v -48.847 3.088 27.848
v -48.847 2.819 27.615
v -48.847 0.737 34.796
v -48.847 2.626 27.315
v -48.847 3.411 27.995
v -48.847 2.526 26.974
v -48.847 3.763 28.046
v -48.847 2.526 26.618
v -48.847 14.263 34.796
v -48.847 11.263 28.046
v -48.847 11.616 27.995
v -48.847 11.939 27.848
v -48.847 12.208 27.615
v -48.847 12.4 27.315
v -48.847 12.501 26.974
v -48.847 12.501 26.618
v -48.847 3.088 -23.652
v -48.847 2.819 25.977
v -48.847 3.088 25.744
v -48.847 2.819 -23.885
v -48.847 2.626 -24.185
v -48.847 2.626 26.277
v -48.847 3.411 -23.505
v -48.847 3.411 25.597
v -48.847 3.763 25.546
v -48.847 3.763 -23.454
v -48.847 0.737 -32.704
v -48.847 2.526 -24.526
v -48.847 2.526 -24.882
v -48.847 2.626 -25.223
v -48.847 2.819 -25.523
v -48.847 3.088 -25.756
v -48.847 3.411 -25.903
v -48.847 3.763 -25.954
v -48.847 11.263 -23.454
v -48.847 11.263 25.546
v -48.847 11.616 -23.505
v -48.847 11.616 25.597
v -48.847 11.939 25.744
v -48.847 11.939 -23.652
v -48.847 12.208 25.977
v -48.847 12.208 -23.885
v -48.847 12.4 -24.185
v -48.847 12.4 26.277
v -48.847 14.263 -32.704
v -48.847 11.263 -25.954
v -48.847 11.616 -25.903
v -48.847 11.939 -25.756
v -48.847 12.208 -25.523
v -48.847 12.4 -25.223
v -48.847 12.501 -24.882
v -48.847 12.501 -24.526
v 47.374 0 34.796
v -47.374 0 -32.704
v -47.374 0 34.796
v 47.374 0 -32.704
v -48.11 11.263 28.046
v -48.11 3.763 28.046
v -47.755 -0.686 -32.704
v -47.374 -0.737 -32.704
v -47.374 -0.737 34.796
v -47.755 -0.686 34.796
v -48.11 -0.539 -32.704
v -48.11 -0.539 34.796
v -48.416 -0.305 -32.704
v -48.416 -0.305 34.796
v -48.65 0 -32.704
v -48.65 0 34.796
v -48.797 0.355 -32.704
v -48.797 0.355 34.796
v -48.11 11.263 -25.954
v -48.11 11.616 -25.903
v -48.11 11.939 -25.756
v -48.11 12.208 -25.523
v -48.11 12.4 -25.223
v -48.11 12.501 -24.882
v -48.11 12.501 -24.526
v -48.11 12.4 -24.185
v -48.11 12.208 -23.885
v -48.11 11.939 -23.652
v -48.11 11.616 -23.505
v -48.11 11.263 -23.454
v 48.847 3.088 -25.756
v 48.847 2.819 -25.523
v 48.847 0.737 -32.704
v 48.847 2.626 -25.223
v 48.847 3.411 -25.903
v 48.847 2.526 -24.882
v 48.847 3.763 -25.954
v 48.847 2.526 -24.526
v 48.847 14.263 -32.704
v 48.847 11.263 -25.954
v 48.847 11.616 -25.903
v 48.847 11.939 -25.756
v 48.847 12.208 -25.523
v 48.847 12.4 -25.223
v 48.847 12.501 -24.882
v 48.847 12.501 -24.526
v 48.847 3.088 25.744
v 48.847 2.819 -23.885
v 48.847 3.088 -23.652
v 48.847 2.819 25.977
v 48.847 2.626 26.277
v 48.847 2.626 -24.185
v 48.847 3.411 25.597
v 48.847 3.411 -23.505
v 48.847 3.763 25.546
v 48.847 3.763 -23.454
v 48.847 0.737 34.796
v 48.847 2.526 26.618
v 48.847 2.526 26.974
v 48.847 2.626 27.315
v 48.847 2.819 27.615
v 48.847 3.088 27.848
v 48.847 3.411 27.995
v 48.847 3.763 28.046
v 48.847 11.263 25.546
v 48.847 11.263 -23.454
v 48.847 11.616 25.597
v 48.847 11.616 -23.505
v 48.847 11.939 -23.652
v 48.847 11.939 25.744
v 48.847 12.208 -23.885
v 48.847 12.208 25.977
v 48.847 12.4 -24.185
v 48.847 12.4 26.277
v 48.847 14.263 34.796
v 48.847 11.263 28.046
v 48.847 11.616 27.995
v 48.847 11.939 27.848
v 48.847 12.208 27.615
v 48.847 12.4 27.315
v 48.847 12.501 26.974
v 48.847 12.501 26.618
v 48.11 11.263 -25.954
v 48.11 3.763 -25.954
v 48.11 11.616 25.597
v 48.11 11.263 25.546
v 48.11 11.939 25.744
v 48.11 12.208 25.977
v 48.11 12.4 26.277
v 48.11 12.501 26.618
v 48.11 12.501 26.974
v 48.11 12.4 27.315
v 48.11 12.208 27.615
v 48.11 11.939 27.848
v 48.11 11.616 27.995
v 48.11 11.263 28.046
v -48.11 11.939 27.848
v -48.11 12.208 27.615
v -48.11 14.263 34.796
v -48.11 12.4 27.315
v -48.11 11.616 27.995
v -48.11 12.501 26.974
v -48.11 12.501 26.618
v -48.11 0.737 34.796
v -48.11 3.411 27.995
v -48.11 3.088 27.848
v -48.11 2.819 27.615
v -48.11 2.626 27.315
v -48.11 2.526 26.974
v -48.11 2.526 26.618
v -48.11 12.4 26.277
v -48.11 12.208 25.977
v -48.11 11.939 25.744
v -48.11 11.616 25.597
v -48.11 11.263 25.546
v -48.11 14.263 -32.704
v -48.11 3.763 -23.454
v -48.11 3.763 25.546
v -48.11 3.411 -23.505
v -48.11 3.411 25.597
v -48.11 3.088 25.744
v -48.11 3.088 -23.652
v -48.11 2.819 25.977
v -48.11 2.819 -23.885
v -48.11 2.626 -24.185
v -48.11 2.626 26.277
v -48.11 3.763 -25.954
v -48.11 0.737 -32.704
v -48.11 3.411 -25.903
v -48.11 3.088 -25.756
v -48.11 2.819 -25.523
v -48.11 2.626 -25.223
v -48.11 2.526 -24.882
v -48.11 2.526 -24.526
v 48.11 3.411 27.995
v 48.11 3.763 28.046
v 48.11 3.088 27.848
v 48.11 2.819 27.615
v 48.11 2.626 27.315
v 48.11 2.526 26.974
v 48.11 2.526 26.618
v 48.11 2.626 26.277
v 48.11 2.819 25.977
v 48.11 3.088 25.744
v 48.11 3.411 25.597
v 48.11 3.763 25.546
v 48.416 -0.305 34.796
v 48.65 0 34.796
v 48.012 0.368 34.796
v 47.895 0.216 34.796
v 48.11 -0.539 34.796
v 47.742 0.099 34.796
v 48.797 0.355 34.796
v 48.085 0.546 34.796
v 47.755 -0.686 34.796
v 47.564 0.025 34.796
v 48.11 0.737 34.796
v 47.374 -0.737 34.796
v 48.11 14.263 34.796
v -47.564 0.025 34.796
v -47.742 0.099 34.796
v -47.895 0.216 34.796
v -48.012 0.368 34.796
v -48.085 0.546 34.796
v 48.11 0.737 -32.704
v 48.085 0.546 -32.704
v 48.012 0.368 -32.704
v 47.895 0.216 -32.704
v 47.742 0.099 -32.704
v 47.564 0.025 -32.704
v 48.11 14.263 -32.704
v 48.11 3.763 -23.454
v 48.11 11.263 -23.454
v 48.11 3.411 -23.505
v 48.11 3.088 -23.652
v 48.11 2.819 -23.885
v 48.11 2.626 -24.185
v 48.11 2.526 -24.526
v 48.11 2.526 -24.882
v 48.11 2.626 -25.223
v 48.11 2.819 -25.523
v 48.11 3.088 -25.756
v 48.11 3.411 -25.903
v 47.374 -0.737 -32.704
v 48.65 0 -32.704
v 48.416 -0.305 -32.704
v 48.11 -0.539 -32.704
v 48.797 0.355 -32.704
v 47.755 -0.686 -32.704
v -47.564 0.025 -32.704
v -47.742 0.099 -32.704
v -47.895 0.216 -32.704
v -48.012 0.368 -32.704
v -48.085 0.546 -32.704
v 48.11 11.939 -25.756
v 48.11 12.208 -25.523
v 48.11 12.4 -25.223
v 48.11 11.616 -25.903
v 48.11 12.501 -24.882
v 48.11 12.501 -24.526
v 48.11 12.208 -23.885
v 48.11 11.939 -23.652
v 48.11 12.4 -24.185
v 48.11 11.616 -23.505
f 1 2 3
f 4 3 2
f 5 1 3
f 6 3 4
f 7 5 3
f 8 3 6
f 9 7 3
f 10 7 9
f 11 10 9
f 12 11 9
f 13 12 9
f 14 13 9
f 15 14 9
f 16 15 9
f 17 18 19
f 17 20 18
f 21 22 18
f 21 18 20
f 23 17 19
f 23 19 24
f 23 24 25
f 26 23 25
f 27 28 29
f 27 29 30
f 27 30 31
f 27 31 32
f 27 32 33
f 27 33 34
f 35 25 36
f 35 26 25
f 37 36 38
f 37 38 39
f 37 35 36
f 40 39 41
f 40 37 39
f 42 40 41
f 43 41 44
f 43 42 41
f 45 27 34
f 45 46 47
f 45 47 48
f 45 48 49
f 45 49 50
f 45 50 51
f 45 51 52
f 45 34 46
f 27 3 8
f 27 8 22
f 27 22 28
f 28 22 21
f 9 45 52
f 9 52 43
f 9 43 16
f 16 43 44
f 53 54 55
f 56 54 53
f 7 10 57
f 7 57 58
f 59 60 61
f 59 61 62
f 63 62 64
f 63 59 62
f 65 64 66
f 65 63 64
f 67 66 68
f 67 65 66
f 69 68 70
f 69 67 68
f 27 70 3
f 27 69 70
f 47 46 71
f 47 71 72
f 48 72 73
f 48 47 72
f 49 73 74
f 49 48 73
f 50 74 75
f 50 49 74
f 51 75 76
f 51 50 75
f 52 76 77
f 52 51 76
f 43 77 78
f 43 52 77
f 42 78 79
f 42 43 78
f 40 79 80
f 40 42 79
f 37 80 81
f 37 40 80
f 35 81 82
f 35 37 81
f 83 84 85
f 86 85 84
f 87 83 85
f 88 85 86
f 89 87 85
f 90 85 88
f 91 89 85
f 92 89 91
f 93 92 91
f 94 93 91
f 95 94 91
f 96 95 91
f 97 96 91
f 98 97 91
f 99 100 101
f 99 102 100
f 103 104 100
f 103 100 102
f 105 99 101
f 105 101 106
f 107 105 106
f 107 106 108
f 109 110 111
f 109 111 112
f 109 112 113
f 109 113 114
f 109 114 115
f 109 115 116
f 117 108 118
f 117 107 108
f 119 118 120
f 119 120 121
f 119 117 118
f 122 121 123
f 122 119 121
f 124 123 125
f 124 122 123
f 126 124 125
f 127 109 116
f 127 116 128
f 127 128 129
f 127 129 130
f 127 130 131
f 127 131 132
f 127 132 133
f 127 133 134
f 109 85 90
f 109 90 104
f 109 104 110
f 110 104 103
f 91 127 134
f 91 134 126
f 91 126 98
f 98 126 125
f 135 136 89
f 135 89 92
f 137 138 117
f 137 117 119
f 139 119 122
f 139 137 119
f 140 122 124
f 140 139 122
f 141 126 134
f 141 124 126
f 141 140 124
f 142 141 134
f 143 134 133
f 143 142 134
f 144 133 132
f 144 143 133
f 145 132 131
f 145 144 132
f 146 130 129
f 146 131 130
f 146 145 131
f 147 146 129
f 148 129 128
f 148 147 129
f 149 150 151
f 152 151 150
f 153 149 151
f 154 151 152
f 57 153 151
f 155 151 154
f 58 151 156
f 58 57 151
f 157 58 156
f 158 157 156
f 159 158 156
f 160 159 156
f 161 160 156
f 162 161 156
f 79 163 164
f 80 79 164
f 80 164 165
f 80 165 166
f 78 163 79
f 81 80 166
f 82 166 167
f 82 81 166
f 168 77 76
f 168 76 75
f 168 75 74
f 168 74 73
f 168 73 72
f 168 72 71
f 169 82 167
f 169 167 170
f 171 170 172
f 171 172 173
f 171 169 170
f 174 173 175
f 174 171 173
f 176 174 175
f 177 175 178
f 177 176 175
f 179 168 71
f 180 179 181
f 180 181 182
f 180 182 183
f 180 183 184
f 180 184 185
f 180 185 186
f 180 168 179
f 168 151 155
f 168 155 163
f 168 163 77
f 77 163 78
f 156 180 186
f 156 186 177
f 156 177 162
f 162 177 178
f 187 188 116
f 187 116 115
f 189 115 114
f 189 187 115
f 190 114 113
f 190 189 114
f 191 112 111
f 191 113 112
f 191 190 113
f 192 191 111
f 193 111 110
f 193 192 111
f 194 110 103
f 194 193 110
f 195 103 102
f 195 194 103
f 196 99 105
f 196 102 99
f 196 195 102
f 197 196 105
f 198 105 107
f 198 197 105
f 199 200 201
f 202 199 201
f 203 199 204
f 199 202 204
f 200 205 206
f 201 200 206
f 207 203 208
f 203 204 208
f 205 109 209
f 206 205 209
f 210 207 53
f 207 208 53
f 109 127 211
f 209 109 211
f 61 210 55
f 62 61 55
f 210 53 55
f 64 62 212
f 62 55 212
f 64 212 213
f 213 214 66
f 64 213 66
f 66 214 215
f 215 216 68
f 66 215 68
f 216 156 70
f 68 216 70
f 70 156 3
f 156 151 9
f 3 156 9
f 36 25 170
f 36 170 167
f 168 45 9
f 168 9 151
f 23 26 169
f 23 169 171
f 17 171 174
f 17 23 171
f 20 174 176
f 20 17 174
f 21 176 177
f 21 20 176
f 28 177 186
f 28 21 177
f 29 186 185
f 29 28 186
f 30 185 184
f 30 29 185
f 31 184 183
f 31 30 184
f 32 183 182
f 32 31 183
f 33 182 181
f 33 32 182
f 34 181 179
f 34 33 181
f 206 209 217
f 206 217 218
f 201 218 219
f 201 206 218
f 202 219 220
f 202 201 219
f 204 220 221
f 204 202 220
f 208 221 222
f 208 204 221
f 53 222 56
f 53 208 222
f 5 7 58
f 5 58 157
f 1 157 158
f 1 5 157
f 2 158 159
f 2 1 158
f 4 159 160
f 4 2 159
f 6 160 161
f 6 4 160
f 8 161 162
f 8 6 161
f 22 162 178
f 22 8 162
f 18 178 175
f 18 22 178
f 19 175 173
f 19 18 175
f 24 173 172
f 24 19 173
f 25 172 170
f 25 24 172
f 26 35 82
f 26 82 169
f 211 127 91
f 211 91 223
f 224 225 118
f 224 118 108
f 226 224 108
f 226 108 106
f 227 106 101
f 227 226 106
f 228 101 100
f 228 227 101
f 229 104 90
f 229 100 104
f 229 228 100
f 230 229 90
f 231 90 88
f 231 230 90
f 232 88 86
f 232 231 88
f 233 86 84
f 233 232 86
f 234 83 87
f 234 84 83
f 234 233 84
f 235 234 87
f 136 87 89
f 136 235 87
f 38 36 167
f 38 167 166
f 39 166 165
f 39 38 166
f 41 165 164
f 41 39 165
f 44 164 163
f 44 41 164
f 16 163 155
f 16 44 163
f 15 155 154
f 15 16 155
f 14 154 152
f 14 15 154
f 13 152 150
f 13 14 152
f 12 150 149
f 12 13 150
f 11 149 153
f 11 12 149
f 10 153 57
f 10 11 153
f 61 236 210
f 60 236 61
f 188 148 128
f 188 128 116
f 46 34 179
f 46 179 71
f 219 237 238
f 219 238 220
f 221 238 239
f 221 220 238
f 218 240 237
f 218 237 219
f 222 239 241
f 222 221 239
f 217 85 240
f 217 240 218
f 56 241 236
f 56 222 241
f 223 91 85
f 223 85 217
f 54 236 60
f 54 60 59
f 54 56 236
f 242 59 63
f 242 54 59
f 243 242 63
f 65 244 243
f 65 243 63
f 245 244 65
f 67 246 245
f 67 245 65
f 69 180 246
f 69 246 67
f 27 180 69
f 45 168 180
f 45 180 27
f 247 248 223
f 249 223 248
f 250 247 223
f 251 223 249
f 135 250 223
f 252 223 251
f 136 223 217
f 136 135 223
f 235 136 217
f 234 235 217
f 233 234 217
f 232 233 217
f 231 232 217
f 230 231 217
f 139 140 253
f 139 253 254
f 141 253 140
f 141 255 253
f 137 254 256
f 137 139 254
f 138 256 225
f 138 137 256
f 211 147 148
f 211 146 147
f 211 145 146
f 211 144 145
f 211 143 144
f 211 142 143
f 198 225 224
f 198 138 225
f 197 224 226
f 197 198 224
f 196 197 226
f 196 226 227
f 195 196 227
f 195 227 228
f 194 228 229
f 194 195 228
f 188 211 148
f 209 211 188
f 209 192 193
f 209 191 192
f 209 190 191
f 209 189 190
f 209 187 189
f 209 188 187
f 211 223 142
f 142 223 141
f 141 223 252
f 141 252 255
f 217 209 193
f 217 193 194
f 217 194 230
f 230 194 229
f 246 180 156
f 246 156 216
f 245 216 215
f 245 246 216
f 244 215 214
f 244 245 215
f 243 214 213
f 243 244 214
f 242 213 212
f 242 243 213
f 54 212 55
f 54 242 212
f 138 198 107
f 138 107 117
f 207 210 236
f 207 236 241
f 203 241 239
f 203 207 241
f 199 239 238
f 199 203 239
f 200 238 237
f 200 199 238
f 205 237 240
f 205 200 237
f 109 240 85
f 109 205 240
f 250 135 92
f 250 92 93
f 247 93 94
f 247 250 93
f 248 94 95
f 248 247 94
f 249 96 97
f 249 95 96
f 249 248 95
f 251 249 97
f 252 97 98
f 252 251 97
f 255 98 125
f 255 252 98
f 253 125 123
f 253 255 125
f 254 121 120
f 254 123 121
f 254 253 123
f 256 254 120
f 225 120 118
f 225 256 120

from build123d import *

# Parameters (mm, degrees)
SKETCH1_W               = 94.2208
SKETCH1_H               = 67.5
BASE_FLANGE1_DEPTH      = 0.7366
EDGE_FLANGE1_DEPTH      = 67.5
EDGE_FLANGE1_BEND_DEPTH = 67.5
CUT_EXTRUDE1_DEPTH      = 105.682033016


# Sheet-metal steps are written as plain solids
with BuildPart() as part:
    # Sketch1 → Base-Flange1 (new body)
    with BuildSketch(Plane(origin=(0, 0, 0), x_dir=(1, 0, 0), z_dir=(0, 1, 0))):
        with Locations((0, -1.046060421)):
            Rectangle(SKETCH1_W, SKETCH1_H)
    extrude(amount=-BASE_FLANGE1_DEPTH)

    # Edge-Flange1 section (across the edge) → Edge-Flange1 (add)
    with BuildSketch(Plane(origin=(48.1104, 0, 34.796060421), x_dir=(-1, 0, 0), z_dir=(0, 0, -1))):
        with BuildLine():
            Line((-0.7366, 0.7366), (-0.7366, 14.2634))
            Line((-0.7366, 14.2634), (0, 14.2634))
            Line((0, 14.2634), (0, 0.7366))
            ThreePointArc((0, 0.7366), (0.215745145, 0.215745145), (0.7366, 0))
            Line((0.7366, 0), (1, 0))
            Line((1, 0), (1, -0.7366))
            Line((1, -0.7366), (0.7366, -0.7366))
            ThreePointArc((0.7366, -0.7366), (-0.30510971, -0.30510971), (-0.7366, 0.7366))
        make_face()
    extrude(amount=EDGE_FLANGE1_DEPTH)

    # Edge-Flange1 section 2 (across the edge) → Edge-Flange1 bend (add)
    with BuildSketch(Plane(origin=(-48.1104, 0, -32.703939579), x_dir=(1, 0, 0), z_dir=(0, 0, 1))):
        with BuildLine():
            Line((-0.7366, 0.7366), (-0.7366, 14.2634))
            Line((-0.7366, 14.2634), (0, 14.2634))
            Line((0, 14.2634), (0, 0.7366))
            ThreePointArc((0, 0.7366), (0.215745145, 0.215745145), (0.7366, 0))
            Line((0.7366, 0), (1, 0))
            Line((1, 0), (1, -0.7366))
            Line((1, -0.7366), (0.7366, -0.7366))
            ThreePointArc((0.7366, -0.7366), (-0.30510971, -0.30510971), (-0.7366, 0.7366))
        make_face()
    extrude(amount=EDGE_FLANGE1_BEND_DEPTH)

    # Sketch13 → Cut-Extrude1 (cut, through all)
    with BuildSketch(Plane.ZY.offset(48.847)):
        with BuildLine():
            Line((28.046060421, 11.2634), (28.046060421, 3.7634))
            ThreePointArc((28.046060421, 3.7634), (26.796060421, 2.5134), (25.546060421, 3.7634))
            Line((25.546060421, 3.7634), (25.546060421, 11.2634))
            ThreePointArc((25.546060421, 11.2634), (26.796060421, 12.5134), (28.046060421, 11.2634))
        make_face()
        with BuildLine():
            Line((-23.453939579, 11.2634), (-23.453939579, 3.7634))
            ThreePointArc((-23.453939579, 3.7634), (-24.703939579, 2.5134), (-25.953939579, 3.7634))
            Line((-25.953939579, 3.7634), (-25.953939579, 11.2634))
            ThreePointArc((-25.953939579, 11.2634), (-24.703939579, 12.5134), (-23.453939579, 11.2634))
        make_face()
    extrude(amount=-CUT_EXTRUDE1_DEPTH, mode=Mode.SUBTRACT)


solid = part.part
